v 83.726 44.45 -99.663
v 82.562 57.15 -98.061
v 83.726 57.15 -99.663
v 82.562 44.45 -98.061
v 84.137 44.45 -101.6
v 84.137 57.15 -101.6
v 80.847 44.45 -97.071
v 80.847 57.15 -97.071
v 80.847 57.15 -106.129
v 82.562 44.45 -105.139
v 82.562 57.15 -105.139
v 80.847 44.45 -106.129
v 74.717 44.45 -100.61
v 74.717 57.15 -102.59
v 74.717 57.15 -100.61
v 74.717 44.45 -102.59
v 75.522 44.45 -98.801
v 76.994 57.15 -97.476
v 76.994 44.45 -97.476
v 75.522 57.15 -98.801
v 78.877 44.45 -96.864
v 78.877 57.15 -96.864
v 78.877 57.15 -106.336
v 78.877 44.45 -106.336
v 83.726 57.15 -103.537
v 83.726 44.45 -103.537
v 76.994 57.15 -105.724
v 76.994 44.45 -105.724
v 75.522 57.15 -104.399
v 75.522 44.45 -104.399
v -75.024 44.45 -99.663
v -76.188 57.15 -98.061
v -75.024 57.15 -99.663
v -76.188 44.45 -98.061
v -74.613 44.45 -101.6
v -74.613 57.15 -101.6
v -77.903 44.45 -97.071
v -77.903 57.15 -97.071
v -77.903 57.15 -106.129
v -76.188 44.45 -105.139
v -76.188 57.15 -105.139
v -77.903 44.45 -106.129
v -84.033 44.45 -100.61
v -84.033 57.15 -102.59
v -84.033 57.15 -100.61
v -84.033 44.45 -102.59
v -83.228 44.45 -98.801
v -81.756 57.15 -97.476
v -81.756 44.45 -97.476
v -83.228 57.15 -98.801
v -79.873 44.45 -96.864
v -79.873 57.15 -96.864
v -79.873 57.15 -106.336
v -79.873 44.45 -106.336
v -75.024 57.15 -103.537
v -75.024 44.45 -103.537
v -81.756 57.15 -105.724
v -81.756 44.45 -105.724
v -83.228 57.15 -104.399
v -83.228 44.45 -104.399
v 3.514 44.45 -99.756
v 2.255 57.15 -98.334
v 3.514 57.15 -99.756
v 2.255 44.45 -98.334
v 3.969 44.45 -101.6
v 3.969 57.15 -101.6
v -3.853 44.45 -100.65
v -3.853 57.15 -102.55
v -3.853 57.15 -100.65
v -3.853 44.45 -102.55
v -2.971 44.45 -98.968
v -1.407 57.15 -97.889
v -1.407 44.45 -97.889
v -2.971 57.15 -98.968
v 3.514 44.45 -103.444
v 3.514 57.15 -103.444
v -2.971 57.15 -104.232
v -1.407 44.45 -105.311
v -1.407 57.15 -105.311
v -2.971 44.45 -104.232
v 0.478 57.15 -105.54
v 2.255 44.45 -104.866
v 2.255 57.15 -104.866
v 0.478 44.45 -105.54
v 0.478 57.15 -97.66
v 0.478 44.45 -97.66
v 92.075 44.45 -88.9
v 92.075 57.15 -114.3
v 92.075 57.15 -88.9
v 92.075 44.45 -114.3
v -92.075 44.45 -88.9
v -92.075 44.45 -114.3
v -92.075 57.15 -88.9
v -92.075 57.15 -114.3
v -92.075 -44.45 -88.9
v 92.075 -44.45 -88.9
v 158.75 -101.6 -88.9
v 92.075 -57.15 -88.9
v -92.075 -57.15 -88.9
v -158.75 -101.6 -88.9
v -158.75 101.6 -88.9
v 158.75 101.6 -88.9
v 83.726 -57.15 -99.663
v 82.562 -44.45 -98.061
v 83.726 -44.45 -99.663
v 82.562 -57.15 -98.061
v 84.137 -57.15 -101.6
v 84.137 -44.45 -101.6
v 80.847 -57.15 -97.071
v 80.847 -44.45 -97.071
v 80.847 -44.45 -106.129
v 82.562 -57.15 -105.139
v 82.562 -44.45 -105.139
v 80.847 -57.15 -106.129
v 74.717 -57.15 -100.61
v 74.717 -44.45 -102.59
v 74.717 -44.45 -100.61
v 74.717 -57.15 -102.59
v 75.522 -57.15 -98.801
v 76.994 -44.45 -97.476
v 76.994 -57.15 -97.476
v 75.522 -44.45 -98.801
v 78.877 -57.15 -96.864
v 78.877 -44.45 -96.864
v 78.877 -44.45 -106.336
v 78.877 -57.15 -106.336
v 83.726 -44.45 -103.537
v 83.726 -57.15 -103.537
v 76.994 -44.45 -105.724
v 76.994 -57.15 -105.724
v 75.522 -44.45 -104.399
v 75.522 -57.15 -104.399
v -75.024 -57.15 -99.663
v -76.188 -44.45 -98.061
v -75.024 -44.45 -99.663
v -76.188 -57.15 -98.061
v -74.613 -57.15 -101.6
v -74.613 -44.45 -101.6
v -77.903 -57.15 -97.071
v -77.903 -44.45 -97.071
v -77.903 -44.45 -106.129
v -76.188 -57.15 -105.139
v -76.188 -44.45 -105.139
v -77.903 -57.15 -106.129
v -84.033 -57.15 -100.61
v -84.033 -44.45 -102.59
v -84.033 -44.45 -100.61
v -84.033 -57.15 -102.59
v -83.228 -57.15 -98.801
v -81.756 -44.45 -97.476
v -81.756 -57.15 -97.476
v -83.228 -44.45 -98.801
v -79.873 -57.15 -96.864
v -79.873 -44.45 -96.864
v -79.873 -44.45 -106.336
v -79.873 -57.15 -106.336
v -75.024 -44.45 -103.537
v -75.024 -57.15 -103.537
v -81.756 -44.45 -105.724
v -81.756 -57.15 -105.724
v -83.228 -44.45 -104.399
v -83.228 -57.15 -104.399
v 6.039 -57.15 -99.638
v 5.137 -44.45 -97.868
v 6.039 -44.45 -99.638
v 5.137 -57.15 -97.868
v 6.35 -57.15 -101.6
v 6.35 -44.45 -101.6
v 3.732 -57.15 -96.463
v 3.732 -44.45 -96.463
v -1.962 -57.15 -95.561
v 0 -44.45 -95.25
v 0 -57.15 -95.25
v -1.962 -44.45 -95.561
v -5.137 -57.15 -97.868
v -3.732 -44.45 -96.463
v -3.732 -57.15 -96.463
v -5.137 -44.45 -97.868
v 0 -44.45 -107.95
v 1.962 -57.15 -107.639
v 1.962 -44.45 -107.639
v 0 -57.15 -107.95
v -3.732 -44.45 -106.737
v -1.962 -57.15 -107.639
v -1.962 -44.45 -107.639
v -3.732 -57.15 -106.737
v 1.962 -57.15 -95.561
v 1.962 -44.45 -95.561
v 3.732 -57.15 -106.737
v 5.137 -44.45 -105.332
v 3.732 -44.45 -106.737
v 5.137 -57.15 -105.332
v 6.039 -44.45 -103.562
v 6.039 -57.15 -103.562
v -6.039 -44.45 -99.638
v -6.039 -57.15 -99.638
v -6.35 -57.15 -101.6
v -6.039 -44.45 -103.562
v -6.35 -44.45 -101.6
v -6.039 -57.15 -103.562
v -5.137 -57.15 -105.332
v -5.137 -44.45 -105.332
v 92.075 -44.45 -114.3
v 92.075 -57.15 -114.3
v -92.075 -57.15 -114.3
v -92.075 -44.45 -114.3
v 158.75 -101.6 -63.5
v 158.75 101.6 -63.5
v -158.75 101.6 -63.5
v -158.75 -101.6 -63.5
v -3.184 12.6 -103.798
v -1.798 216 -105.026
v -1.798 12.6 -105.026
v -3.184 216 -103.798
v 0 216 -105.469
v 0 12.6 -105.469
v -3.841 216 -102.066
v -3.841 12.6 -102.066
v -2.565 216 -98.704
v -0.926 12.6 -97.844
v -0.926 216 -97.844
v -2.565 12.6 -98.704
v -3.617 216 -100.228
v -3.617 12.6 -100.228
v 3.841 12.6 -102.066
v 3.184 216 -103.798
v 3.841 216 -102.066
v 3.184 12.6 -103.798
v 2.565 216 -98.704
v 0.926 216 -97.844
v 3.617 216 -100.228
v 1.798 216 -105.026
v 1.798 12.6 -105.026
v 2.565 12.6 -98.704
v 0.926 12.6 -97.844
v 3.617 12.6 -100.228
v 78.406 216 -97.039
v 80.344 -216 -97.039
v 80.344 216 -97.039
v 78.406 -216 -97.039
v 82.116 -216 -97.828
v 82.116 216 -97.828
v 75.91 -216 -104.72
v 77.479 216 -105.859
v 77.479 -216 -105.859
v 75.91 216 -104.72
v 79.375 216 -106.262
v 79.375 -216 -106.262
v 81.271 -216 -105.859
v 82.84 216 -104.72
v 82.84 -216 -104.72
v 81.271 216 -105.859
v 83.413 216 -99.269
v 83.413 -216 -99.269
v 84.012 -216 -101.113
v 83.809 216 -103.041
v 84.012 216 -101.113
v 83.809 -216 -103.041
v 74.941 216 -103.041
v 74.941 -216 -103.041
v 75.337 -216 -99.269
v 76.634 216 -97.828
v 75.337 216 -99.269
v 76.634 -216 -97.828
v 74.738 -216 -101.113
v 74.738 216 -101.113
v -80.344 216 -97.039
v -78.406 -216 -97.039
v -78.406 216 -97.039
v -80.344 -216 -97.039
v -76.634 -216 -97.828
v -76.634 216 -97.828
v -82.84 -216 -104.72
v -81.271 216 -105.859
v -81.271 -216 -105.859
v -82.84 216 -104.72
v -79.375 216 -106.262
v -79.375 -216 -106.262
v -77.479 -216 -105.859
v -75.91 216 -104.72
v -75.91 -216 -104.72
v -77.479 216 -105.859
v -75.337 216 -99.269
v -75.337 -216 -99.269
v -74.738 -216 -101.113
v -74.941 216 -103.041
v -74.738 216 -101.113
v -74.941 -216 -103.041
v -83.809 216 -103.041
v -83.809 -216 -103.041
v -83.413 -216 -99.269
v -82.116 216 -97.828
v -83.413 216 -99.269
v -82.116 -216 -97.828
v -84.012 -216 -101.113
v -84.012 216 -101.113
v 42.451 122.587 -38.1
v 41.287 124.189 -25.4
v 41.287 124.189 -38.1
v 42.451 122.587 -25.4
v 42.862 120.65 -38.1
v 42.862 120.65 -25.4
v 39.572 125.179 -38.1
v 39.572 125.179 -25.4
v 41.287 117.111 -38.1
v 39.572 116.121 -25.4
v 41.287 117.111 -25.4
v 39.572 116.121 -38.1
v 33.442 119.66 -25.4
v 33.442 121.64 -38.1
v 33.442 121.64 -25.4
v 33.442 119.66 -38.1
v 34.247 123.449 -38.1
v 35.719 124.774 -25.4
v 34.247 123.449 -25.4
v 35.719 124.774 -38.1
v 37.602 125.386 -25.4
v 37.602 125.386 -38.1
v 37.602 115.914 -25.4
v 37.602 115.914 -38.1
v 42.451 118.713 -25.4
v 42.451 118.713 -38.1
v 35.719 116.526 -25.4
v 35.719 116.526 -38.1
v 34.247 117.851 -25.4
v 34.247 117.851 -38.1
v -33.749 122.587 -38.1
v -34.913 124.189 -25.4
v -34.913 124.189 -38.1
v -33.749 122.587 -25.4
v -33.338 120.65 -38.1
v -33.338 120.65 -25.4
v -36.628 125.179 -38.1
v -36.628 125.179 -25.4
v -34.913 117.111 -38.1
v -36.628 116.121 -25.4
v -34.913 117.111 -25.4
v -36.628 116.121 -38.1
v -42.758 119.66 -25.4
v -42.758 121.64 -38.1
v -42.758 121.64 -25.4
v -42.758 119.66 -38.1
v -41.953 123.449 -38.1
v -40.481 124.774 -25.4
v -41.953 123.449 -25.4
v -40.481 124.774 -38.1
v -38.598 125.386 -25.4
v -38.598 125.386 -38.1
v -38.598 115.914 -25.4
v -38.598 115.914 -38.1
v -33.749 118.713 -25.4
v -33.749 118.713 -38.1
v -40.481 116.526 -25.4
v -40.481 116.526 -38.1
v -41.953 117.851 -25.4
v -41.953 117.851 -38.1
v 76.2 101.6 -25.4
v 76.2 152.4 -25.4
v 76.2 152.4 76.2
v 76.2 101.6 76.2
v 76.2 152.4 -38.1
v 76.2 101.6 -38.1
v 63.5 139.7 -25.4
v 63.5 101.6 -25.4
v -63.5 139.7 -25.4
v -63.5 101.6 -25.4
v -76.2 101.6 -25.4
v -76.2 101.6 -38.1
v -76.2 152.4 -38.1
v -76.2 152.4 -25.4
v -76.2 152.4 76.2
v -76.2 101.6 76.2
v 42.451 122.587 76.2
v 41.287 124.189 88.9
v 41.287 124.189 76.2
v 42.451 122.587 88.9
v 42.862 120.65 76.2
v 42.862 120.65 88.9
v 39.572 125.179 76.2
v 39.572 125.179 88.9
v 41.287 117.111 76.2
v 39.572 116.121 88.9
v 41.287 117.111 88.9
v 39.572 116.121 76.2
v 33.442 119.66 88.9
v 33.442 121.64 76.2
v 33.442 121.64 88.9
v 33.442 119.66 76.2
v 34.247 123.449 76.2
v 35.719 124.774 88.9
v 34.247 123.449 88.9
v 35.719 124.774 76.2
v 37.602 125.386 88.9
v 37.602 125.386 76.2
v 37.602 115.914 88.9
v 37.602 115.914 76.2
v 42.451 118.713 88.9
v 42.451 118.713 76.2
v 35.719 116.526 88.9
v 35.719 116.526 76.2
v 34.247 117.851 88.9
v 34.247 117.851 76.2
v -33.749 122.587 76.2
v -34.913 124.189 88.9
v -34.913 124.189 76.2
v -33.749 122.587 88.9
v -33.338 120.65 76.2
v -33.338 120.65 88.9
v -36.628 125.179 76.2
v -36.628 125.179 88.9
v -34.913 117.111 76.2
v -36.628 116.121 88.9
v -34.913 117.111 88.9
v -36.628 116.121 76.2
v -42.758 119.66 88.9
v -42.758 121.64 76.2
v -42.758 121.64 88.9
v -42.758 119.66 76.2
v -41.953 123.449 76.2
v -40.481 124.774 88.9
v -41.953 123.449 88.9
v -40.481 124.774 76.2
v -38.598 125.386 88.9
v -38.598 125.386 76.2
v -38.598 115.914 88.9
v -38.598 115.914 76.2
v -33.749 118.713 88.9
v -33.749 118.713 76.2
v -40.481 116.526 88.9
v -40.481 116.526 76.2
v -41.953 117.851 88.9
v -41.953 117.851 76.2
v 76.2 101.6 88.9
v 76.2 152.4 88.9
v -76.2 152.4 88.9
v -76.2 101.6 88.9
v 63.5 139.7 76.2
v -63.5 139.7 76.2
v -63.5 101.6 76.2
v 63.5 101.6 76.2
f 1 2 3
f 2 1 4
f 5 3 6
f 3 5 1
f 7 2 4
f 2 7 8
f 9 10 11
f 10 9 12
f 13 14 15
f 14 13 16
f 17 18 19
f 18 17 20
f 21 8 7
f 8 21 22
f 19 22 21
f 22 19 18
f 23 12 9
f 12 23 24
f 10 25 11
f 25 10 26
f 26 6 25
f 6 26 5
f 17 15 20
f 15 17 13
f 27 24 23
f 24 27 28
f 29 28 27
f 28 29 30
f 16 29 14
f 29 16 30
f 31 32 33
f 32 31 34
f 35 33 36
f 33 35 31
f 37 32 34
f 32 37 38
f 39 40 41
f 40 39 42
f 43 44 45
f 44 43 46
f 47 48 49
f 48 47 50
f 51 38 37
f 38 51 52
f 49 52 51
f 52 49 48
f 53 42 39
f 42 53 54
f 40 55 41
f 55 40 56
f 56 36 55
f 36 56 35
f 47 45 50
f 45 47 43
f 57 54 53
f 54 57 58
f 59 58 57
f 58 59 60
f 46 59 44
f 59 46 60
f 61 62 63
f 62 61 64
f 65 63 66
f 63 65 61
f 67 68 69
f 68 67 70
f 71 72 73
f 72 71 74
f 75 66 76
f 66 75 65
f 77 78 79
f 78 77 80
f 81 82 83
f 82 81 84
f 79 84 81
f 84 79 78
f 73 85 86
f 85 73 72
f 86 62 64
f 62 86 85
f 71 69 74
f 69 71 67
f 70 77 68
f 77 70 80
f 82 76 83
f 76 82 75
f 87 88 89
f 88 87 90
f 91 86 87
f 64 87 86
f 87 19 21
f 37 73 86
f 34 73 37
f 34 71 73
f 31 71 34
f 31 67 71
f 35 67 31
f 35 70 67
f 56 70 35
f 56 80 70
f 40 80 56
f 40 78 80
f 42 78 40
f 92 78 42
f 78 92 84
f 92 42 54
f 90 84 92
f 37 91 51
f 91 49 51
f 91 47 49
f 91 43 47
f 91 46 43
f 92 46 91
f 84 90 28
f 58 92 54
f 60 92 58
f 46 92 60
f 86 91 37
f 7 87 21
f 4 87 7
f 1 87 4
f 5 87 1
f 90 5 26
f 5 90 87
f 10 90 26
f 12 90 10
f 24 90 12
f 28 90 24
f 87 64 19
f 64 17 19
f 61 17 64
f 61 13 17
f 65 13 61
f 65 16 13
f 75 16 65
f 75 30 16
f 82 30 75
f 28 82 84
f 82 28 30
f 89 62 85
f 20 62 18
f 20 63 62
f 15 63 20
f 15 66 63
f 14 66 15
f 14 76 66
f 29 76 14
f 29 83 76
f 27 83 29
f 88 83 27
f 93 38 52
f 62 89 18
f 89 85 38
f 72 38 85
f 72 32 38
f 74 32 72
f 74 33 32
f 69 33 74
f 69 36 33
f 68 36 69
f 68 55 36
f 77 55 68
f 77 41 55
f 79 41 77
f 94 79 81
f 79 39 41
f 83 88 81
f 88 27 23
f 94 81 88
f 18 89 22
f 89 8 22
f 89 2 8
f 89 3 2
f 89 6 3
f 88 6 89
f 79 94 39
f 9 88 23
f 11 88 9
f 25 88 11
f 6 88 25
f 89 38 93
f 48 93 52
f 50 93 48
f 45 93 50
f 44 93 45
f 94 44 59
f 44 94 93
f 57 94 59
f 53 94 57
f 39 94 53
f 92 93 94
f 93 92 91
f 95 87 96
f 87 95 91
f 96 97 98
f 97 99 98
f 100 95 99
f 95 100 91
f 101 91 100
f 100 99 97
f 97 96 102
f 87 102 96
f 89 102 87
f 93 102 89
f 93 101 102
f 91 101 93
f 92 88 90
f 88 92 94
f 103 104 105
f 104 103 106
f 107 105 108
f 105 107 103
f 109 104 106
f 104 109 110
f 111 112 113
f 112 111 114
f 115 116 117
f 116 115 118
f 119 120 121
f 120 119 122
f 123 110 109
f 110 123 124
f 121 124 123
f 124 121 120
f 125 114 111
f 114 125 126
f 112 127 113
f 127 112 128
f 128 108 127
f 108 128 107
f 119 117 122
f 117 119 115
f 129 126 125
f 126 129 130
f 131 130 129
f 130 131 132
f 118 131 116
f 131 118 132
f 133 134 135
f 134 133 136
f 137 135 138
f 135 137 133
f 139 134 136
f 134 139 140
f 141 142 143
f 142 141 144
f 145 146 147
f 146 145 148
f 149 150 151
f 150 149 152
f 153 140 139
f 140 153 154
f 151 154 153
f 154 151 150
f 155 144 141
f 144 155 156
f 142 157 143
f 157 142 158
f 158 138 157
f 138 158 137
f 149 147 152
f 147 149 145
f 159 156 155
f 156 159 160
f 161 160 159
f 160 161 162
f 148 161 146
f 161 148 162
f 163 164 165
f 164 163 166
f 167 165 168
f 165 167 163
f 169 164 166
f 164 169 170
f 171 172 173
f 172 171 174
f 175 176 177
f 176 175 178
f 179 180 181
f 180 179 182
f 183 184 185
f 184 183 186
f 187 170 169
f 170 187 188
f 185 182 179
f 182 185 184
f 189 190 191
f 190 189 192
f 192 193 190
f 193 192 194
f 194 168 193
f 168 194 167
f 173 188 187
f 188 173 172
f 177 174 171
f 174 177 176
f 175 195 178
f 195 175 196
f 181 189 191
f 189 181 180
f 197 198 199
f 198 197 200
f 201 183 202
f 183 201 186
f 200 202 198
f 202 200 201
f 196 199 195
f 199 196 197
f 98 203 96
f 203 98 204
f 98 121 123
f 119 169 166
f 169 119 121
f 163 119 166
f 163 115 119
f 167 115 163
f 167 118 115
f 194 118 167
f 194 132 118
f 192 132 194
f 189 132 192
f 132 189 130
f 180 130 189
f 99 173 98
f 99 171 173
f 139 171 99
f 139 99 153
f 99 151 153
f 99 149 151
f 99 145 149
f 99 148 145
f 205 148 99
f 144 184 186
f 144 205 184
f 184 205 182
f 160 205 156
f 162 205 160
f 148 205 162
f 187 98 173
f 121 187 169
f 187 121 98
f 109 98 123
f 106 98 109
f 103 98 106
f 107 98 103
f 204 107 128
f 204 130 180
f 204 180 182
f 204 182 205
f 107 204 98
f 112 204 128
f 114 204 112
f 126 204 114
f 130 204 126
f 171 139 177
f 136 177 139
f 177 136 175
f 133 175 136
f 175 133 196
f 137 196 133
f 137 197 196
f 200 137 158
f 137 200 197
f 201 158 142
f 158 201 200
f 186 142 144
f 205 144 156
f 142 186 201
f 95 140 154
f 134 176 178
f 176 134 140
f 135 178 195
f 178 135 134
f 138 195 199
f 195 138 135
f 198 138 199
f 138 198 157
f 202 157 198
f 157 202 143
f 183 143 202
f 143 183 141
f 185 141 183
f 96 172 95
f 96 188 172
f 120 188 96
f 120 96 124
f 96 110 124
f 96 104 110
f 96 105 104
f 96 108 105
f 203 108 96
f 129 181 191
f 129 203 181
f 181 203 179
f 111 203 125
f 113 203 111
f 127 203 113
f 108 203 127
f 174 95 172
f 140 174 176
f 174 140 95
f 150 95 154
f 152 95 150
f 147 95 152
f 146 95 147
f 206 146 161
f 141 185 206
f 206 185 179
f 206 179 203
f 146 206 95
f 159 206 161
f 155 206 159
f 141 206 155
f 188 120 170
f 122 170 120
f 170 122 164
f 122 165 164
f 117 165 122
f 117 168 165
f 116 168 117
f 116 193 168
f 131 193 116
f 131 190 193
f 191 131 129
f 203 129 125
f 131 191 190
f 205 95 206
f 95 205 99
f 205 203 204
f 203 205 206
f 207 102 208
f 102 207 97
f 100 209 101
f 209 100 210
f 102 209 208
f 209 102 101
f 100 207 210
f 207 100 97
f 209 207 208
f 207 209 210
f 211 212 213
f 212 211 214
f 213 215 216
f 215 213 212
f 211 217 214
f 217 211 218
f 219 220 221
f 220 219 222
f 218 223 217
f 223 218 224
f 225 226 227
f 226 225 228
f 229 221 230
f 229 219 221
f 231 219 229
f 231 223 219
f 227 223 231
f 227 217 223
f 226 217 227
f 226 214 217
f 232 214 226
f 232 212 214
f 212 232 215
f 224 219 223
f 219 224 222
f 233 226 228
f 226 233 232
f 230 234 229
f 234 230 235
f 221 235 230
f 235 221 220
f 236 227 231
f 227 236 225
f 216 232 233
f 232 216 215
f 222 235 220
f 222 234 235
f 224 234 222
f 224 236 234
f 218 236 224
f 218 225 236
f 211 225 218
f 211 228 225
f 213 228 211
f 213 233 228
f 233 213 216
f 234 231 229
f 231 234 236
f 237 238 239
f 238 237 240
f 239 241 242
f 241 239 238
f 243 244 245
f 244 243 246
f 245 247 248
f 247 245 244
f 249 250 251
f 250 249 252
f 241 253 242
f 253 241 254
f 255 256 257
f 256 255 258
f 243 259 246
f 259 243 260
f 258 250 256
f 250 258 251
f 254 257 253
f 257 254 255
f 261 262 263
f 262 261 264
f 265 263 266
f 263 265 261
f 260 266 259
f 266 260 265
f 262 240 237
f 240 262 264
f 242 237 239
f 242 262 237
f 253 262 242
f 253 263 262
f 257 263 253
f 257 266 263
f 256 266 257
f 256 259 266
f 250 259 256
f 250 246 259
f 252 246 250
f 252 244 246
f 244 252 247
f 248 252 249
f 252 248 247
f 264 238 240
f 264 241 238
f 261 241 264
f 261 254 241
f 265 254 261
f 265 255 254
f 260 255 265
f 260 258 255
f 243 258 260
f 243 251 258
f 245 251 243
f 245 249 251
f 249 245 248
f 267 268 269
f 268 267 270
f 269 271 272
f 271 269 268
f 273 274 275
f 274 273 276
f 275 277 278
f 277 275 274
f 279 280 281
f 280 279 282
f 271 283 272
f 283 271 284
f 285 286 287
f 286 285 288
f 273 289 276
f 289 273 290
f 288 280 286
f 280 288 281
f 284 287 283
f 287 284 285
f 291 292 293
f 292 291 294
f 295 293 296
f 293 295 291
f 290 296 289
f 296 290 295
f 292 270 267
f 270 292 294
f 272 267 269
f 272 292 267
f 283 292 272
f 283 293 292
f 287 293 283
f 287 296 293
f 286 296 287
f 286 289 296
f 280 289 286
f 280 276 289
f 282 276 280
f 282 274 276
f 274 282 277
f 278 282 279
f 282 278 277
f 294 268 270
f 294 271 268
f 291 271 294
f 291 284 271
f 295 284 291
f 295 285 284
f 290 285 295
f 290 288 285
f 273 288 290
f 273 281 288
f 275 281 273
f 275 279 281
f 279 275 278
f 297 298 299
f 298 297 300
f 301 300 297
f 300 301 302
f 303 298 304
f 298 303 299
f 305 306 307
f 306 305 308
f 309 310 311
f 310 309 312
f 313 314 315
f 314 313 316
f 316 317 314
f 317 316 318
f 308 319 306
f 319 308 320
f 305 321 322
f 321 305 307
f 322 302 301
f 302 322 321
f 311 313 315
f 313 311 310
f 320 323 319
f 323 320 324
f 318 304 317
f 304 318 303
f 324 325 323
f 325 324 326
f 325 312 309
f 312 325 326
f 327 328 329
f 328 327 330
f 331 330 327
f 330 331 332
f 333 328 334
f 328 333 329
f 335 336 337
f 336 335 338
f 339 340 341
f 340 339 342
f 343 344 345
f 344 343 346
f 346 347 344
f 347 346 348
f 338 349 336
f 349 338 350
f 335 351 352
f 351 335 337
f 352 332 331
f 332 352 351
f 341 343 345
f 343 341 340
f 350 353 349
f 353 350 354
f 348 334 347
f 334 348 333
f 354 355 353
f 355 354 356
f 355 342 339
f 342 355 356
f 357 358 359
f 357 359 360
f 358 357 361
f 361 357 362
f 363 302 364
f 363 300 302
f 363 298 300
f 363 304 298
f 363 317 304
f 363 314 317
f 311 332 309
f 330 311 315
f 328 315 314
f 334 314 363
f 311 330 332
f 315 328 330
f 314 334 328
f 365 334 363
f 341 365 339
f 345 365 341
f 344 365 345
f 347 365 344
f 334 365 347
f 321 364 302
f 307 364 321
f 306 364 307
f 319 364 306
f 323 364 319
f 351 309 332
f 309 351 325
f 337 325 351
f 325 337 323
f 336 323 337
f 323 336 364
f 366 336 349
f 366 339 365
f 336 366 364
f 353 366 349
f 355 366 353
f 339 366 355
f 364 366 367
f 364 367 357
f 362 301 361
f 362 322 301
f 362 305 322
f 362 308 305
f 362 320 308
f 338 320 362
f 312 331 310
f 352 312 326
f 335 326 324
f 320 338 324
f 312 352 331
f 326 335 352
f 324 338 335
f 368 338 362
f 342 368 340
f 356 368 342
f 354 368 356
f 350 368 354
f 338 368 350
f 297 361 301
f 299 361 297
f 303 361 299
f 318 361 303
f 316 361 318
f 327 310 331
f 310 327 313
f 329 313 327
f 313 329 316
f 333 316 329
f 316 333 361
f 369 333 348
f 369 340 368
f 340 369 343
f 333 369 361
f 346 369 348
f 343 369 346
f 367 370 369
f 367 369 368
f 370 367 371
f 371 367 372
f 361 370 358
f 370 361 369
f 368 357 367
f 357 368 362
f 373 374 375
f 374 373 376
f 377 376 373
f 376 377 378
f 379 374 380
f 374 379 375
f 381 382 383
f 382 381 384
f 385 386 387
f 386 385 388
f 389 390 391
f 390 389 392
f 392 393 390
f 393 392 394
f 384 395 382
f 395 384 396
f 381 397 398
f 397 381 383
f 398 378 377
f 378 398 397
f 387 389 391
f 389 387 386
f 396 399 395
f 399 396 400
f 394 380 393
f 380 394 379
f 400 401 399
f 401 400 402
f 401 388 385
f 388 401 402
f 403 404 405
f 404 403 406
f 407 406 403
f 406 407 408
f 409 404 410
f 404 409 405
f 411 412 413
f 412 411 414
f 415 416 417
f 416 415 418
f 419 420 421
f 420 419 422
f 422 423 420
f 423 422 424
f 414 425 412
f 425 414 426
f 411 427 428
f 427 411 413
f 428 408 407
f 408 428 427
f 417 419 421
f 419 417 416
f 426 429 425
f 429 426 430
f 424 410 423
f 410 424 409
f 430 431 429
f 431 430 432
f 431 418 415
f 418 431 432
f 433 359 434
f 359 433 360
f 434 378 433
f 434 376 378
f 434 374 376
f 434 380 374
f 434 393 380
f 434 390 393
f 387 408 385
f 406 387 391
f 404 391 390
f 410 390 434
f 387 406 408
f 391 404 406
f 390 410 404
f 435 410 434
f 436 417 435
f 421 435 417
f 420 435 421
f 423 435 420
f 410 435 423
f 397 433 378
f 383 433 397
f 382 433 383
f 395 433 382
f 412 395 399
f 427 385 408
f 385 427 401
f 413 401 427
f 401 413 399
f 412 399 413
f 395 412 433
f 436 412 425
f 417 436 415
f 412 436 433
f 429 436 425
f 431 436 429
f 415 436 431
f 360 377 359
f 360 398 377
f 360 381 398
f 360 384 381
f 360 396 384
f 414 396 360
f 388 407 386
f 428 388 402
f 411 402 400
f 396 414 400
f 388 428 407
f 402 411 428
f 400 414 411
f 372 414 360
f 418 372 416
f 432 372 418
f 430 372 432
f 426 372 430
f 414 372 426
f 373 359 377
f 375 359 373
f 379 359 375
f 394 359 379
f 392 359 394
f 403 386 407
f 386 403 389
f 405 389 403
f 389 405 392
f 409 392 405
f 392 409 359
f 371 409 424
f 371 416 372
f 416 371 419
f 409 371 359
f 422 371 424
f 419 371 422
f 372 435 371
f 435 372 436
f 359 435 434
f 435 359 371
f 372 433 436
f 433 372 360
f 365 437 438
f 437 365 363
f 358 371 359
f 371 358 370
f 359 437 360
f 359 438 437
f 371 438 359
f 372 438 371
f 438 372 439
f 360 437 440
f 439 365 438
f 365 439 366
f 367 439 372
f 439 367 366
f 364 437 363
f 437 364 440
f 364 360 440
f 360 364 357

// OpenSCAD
include <MCAD/units.scad>
include <MCAD/stepper.scad>
include <MCAD/materials.scad>
include <MCAD/screw.scad>
include <MCAD/nuts_and_bolts.scad>

mode = "assembled";
//mode = "assembled_gantry";
//mode = "parts";

//show_body = true;

// Parameters ====================================================================

// What thickness of material are we building these machine from?

plate_thickness = 0.5 * inch;
plate_material = Birch;

// What size of envelope do we have?

envelope_x = 11.5 * inch;
envelope_y = 8 * inch;
envelope_z = 2 * inch;

// Where is the tool head?

seek_x = 11.5/2 * inch;
seek_y = 8/2 * inch;
seek_z = 2 * inch;

// What size of stepper are we using?

stepper_size = Nema17;
stepper_cutout_diameter = 1 * inch;

// How big are our mechanicals?

rod_diameter = 3/8 * inch;
leadscrew_diameter = 5/16 * inch;
leadscrew_cutout_diameter = 1/2 * inch;

epsilon = 0.1 * mm;

// Calculated Values ============================================================= 

cutout_thickness = 2 * plate_thickness;
cutout_offset = -1/2 * plate_thickness;

// Bed ---------------------------------------------------------------------------

bed_x = envelope_x + 1 * inch;
bed_y = envelope_y;

// Bed bearing block.
bed_bearing_center_to_rod = bed_x * 1 / 4;
bed_bearing_x = bed_bearing_center_to_rod * 2 + 1 * inch;
bed_bearing_y = 1 * inch;
bed_bearing_z = 1/2 * inch;

// How far apart are the bearing blocks?
bed_bearing_separation = bed_y / 2;

// Distance from top of bottom plate to bottom of y axis bearing block.
bed_bearing_height = 1 * inch;


// Gantry ------------------------------------------------------------------------

gantry_x = 6 * inch;
gantry_y = 2 * inch;
gantry_z = 2 * envelope_z + 2 * plate_thickness;

gantry_bearing_center_to_rod = gantry_x * 1/4;
gantry_bearing_x = gantry_bearing_center_to_rod * 2 + 1 * inch;
gantry_bearing_y = 1 * inch;
gantry_bearing_z = 1/2 * inch;

// How far apart are the bearing blocks?
gantry_bearing_separation = 4 * inch;

// Distance from the front of the back plate to the back of the gantry.
gantry_depth = 4 * inch;

// Distance from the top of the base plate to the bottom of the gantry.
gantry_height = 4 * inch;

// Distance from the front of the back gantry plate to the back of the z
// axis bearing black.
gantry_bearing_depth = 3/4 * inch;


// Extents -----------------------------------------------------------------------

// How physically big is the machine?

body_x = bed_x + gantry_x;
body_y = bed_y * 2 + 2 * plate_thickness;
body_z = 12 * inch;

// How big is the cutout around the front of the machine?

body_lip_height = 4 * inch;
body_lip_depth = 10 * inch;


// Radii -------------------------------------------------------------------------

stepper_cutout_radius = 1/2 * stepper_cutout_diameter;
rod_radius = 1/2 * rod_diameter;
leadscrew_radius = 1/2 * leadscrew_diameter;
leadscrew_cutout_radius = 1/2 * leadscrew_cutout_diameter;

// Patterns ======================================================================


module pattern_stepper_mounting_holes( stepper_size ) {
	mounting_spacing = lookup(NemaDistanceBetweenMountingHoles, stepper_size);
	mounting_diameter = lookup(NemaMountingHoleDiameter, stepper_size);

	union() {
		translate([	
			1/2 * mounting_spacing,
			1/2 * mounting_spacing,
			0
		])
			cylinder( 
				h = cutout_thickness,
				r = 1/2 * mounting_diameter
			);

		translate([	
			1/2 * mounting_spacing,
			-1/2 * mounting_spacing,
			0
		])
			cylinder( 
				h = cutout_thickness,
				r = 1/2 * mounting_diameter
			);

		translate([	
			-1/2 * mounting_spacing,
			-1/2 * mounting_spacing,
			0
		])
			cylinder( 
				h = cutout_thickness,
				r = 1/2 * mounting_diameter
			);

		translate([	
			-1/2 * mounting_spacing,
			1/2 * mounting_spacing,
			0
		])
			cylinder( 
				h = cutout_thickness,
				r = 1/2 * mounting_diameter
			);
	}
}

module pattern_stepper_mount() {

	union() {
		cylinder( 
			h = cutout_thickness,
			r = stepper_cutout_radius
		);

		pattern_stepper_mounting_holes( Nema23 );
		pattern_stepper_mounting_holes( Nema17 );
	}
}


module pattern_cross_nut(
		cross_diameter = 0.5 * inch,
		screw_diameter = 0.25 * inch,
		screw_length = 1.5 * inch
	) {

	union() {
		cylinder( 
			h = cutout_thickness,
			r = cross_diameter / 2
		);

		translate([0,0,cutout_thickness / 2] )rotate( [90,0,0] )
		cylinder( 
			h = screw_length,
			r = screw_diameter / 2
		);
	}
}

module pattern_bed_bearings() {
	union() {
		translate( [0, 0, cutout_offset] ) {
			translate( [bed_bearing_x / 2 + bed_bearing_center_to_rod, 0, 0] ) {
				cylinder(
					h = cutout_thickness,
					r = rod_radius
				);
			}
			translate( [bed_bearing_x / 2 - bed_bearing_center_to_rod, 0, 0] ) {
				cylinder(
					h = cutout_thickness,
					r = rod_radius
				);
			}
		}
	}
}

module pattern_gantry_bearings() {
	union() {
		translate( [0, 0, cutout_offset] ) {
			translate( [gantry_bearing_x / 2 + gantry_bearing_center_to_rod, 0, 0] ) {
				cylinder(
					h = cutout_thickness,
					r = rod_radius
				);
			}
			translate( [gantry_bearing_x / 2 - gantry_bearing_center_to_rod, 0, 0] ) {
				cylinder(
					h = cutout_thickness,
					r = rod_radius
				);
			}
		}
	}
}

// Part ==========================================================================

// MDF Parts ---------------------------------------------------------------------

// Bed

module bed_bottom() {
	color(
		plate_material
	)
	cube( [bed_x, bed_y, plate_thickness] );
}

module bed_top() {
	bed_bottom();
}

// Gantry

module gantry_back() {
	color(
		plate_material
	)
	cube( [gantry_x, gantry_z - 2 * plate_thickness, plate_thickness] );
}

module gantry_bottom() {
	color(
		plate_material
	)
	difference() {
		cube( [gantry_x, gantry_y, plate_thickness] );
		union() {
			translate( [gantry_x / 2 - gantry_bearing_x/2, gantry_y - gantry_bearing_depth - plate_thickness, 0 ] )
			pattern_gantry_bearings();
		}
	}
}

module gantry_top() {
	color(
		plate_material
	)
	cube( [gantry_x, gantry_y, plate_thickness] );
}


module gantry_either_side() {
	color(
		plate_material
	)
	cube( [gantry_y-plate_thickness, gantry_z - 2 * plate_thickness, plate_thickness] );
}


// Body

module body_bottom() {
	color(
		plate_material
	)
	cube( [body_x, body_y, plate_thickness] );
}

module body_back() {
	color(
		plate_material
	)
	difference() {
		cube( [body_x, body_z - plate_thickness, plate_thickness] );
		union() {
			translate( [ body_x/2 - bed_bearing_x/2, bed_bearing_height + bed_bearing_y / 2 ] )
				pattern_bed_bearings();

			translate( [body_x/2, bed_bearing_height + plate_thickness, cutout_offset] )
				pattern_stepper_mount();
		}
	}
}

module body_front() {
	color(
		plate_material
	)
	difference() {
		cube( [body_x, body_lip_height - plate_thickness, plate_thickness] );
		union() {
			translate( [ body_x/2 - bed_bearing_x/2, bed_bearing_height + bed_bearing_y / 2 ] )
				pattern_bed_bearings();
		}
	}
}

module body_either_side() {
	color(
		plate_material
	)
	linear_extrude(	
		height = plate_thickness,
		convexity = 10
	)
	polygon(
		points=[
			[0,0],
			[0, body_lip_height - plate_thickness],
			[body_lip_depth - plate_thickness,body_lip_height - plate_thickness],
			[body_lip_depth - plate_thickness, body_z - plate_thickness],
			[body_y - 2 * plate_thickness, body_z - plate_thickness],
			[body_y - 2 * plate_thickness, 0]
		],
		paths=[[0,1,2,3,4,5]],
		convexity = 10
	);
}

module body_left_side() {
	body_either_side();
}

module body_right_side() {
	body_either_side();
}

// Plastic Parts -----------------------------------------------------------------

module bed_bearing( leadscrew_nut = false ) {
	color(
		[1,1,1]
	)
	difference() {
		cube( [bed_bearing_x, bed_bearing_y, bed_bearing_z] );
		union() {
			translate( [0, bed_bearing_y / 2, cutout_offset] ) {
				translate( [bed_bearing_x / 2, 0, 0] )
					if( leadscrew_nut == true ) {
						cylinder(
							h = cutout_thickness,
							r = leadscrew_radius
						);
					} else {
						cylinder(
							h = cutout_thickness,
							r = leadscrew_cutout_radius
						);
					}
			}
			translate( [0, bed_bearing_y / 2, 0 ] ) {
				pattern_bed_bearings();
			}	
		}
	}
}


// Mechanical Parts --------------------------------------------------------------

module bearing_y() {
	translate( [0, -epsilon, 0 ] )
		rotate( [0,90,90] )
			color( 
				Steel
			)
			cylinder(
				h = body_y + 2 * epsilon,
				r = rod_radius - epsilon
			);
}

module leadscrew_y() {
	translate( [0, body_y - envelope_y -epsilon, 0 ] )
		rotate( [0,90,90] )
			color( 
				Steel
			)
			cylinder(
				h = envelope_y + 2 * epsilon,
				r = leadscrew_radius - epsilon
			);
}

// Assemblies ====================================================================

module mechanical_y_axis_assembled() {
	translate( [ body_x/2, 0, bed_bearing_height + bed_bearing_y / 2 + plate_thickness] ) {
		leadscrew_y();

		translate( [bed_bearing_center_to_rod,0,0] )
			bearing_y();

		translate( [-bed_bearing_center_to_rod,0,0] )
			bearing_y();
	}

}

module bed_assembled() {

	translate( [0, 0, bed_bearing_y] )
		bed_bottom();
	translate( [0, 0, bed_bearing_y + plate_thickness] )
		bed_top();

	translate( [bed_x / 2 - bed_bearing_x / 2, 0, 0] ) {

		translate( [0, bed_y / 2 + bed_bearing_separation / 2 + bed_bearing_z/2, 0 ] )
			rotate( [90,0,0] )
				bed_bearing( leadscrew_nut = true);
	
		translate( [0, bed_y / 2 - bed_bearing_separation / 2 + bed_bearing_z/2, 0 ] )
			rotate( [90,0,0] )
				bed_bearing( leadscrew_nut = false);
	}

}

module gantry_assembled() {
	translate( [0,plate_thickness,plate_thickness] )
		rotate( [90,0,0] )
			gantry_back();

	translate( [0,-gantry_y + plate_thickness, 0 ] )
		gantry_bottom();

	translate( [0,-gantry_y + plate_thickness, gantry_z - plate_thickness ] )
		gantry_bottom();

	translate( [0,-gantry_y + plate_thickness, plate_thickness ] )
		rotate( [90,0,90] )
			gantry_either_side();

	translate( [gantry_x - plate_thickness,-gantry_y + plate_thickness, plate_thickness ] )
		rotate( [90,0,90] )
			gantry_either_side();
}

module body_assembled() {
	body_bottom();

	translate( [ 0, body_y, plate_thickness ] )
		rotate( [90,0,0] )
			body_back();

	translate( [ 0, plate_thickness, plate_thickness ] )
		rotate( [90,0,0] )
			body_front();

	translate( [ 0, plate_thickness, plate_thickness ] )
		rotate( [90,0,90] )
			body_left_side();

	translate( [ body_x - plate_thickness, plate_thickness, plate_thickness ] )
		rotate( [90,0,90] )
			body_left_side();
}



// Top Level Geometry ============================================================

module assembled() {
	translate( [-1/2 * body_x, -1/2 * body_y, -1/2 * body_z] ) {

		translate( [ body_x / 2 - bed_x / 2 , seek_y + plate_thickness, plate_thickness + bed_bearing_height ] ) {
			bed_assembled();
		}
		mechanical_y_axis_assembled();
		%body_assembled();

		translate( [plate_thickness + seek_x, body_x - plate_thickness -gantry_depth, gantry_height + plate_thickness ] )
		gantry_assembled();
	}
}


module parts() {

}

// Choose Our Top Level ----------------------------------------------------------

if (mode == "parts")
	parts();

if (mode == "exploded")
	exploded();

if (mode == "assembled")
	assembled();
